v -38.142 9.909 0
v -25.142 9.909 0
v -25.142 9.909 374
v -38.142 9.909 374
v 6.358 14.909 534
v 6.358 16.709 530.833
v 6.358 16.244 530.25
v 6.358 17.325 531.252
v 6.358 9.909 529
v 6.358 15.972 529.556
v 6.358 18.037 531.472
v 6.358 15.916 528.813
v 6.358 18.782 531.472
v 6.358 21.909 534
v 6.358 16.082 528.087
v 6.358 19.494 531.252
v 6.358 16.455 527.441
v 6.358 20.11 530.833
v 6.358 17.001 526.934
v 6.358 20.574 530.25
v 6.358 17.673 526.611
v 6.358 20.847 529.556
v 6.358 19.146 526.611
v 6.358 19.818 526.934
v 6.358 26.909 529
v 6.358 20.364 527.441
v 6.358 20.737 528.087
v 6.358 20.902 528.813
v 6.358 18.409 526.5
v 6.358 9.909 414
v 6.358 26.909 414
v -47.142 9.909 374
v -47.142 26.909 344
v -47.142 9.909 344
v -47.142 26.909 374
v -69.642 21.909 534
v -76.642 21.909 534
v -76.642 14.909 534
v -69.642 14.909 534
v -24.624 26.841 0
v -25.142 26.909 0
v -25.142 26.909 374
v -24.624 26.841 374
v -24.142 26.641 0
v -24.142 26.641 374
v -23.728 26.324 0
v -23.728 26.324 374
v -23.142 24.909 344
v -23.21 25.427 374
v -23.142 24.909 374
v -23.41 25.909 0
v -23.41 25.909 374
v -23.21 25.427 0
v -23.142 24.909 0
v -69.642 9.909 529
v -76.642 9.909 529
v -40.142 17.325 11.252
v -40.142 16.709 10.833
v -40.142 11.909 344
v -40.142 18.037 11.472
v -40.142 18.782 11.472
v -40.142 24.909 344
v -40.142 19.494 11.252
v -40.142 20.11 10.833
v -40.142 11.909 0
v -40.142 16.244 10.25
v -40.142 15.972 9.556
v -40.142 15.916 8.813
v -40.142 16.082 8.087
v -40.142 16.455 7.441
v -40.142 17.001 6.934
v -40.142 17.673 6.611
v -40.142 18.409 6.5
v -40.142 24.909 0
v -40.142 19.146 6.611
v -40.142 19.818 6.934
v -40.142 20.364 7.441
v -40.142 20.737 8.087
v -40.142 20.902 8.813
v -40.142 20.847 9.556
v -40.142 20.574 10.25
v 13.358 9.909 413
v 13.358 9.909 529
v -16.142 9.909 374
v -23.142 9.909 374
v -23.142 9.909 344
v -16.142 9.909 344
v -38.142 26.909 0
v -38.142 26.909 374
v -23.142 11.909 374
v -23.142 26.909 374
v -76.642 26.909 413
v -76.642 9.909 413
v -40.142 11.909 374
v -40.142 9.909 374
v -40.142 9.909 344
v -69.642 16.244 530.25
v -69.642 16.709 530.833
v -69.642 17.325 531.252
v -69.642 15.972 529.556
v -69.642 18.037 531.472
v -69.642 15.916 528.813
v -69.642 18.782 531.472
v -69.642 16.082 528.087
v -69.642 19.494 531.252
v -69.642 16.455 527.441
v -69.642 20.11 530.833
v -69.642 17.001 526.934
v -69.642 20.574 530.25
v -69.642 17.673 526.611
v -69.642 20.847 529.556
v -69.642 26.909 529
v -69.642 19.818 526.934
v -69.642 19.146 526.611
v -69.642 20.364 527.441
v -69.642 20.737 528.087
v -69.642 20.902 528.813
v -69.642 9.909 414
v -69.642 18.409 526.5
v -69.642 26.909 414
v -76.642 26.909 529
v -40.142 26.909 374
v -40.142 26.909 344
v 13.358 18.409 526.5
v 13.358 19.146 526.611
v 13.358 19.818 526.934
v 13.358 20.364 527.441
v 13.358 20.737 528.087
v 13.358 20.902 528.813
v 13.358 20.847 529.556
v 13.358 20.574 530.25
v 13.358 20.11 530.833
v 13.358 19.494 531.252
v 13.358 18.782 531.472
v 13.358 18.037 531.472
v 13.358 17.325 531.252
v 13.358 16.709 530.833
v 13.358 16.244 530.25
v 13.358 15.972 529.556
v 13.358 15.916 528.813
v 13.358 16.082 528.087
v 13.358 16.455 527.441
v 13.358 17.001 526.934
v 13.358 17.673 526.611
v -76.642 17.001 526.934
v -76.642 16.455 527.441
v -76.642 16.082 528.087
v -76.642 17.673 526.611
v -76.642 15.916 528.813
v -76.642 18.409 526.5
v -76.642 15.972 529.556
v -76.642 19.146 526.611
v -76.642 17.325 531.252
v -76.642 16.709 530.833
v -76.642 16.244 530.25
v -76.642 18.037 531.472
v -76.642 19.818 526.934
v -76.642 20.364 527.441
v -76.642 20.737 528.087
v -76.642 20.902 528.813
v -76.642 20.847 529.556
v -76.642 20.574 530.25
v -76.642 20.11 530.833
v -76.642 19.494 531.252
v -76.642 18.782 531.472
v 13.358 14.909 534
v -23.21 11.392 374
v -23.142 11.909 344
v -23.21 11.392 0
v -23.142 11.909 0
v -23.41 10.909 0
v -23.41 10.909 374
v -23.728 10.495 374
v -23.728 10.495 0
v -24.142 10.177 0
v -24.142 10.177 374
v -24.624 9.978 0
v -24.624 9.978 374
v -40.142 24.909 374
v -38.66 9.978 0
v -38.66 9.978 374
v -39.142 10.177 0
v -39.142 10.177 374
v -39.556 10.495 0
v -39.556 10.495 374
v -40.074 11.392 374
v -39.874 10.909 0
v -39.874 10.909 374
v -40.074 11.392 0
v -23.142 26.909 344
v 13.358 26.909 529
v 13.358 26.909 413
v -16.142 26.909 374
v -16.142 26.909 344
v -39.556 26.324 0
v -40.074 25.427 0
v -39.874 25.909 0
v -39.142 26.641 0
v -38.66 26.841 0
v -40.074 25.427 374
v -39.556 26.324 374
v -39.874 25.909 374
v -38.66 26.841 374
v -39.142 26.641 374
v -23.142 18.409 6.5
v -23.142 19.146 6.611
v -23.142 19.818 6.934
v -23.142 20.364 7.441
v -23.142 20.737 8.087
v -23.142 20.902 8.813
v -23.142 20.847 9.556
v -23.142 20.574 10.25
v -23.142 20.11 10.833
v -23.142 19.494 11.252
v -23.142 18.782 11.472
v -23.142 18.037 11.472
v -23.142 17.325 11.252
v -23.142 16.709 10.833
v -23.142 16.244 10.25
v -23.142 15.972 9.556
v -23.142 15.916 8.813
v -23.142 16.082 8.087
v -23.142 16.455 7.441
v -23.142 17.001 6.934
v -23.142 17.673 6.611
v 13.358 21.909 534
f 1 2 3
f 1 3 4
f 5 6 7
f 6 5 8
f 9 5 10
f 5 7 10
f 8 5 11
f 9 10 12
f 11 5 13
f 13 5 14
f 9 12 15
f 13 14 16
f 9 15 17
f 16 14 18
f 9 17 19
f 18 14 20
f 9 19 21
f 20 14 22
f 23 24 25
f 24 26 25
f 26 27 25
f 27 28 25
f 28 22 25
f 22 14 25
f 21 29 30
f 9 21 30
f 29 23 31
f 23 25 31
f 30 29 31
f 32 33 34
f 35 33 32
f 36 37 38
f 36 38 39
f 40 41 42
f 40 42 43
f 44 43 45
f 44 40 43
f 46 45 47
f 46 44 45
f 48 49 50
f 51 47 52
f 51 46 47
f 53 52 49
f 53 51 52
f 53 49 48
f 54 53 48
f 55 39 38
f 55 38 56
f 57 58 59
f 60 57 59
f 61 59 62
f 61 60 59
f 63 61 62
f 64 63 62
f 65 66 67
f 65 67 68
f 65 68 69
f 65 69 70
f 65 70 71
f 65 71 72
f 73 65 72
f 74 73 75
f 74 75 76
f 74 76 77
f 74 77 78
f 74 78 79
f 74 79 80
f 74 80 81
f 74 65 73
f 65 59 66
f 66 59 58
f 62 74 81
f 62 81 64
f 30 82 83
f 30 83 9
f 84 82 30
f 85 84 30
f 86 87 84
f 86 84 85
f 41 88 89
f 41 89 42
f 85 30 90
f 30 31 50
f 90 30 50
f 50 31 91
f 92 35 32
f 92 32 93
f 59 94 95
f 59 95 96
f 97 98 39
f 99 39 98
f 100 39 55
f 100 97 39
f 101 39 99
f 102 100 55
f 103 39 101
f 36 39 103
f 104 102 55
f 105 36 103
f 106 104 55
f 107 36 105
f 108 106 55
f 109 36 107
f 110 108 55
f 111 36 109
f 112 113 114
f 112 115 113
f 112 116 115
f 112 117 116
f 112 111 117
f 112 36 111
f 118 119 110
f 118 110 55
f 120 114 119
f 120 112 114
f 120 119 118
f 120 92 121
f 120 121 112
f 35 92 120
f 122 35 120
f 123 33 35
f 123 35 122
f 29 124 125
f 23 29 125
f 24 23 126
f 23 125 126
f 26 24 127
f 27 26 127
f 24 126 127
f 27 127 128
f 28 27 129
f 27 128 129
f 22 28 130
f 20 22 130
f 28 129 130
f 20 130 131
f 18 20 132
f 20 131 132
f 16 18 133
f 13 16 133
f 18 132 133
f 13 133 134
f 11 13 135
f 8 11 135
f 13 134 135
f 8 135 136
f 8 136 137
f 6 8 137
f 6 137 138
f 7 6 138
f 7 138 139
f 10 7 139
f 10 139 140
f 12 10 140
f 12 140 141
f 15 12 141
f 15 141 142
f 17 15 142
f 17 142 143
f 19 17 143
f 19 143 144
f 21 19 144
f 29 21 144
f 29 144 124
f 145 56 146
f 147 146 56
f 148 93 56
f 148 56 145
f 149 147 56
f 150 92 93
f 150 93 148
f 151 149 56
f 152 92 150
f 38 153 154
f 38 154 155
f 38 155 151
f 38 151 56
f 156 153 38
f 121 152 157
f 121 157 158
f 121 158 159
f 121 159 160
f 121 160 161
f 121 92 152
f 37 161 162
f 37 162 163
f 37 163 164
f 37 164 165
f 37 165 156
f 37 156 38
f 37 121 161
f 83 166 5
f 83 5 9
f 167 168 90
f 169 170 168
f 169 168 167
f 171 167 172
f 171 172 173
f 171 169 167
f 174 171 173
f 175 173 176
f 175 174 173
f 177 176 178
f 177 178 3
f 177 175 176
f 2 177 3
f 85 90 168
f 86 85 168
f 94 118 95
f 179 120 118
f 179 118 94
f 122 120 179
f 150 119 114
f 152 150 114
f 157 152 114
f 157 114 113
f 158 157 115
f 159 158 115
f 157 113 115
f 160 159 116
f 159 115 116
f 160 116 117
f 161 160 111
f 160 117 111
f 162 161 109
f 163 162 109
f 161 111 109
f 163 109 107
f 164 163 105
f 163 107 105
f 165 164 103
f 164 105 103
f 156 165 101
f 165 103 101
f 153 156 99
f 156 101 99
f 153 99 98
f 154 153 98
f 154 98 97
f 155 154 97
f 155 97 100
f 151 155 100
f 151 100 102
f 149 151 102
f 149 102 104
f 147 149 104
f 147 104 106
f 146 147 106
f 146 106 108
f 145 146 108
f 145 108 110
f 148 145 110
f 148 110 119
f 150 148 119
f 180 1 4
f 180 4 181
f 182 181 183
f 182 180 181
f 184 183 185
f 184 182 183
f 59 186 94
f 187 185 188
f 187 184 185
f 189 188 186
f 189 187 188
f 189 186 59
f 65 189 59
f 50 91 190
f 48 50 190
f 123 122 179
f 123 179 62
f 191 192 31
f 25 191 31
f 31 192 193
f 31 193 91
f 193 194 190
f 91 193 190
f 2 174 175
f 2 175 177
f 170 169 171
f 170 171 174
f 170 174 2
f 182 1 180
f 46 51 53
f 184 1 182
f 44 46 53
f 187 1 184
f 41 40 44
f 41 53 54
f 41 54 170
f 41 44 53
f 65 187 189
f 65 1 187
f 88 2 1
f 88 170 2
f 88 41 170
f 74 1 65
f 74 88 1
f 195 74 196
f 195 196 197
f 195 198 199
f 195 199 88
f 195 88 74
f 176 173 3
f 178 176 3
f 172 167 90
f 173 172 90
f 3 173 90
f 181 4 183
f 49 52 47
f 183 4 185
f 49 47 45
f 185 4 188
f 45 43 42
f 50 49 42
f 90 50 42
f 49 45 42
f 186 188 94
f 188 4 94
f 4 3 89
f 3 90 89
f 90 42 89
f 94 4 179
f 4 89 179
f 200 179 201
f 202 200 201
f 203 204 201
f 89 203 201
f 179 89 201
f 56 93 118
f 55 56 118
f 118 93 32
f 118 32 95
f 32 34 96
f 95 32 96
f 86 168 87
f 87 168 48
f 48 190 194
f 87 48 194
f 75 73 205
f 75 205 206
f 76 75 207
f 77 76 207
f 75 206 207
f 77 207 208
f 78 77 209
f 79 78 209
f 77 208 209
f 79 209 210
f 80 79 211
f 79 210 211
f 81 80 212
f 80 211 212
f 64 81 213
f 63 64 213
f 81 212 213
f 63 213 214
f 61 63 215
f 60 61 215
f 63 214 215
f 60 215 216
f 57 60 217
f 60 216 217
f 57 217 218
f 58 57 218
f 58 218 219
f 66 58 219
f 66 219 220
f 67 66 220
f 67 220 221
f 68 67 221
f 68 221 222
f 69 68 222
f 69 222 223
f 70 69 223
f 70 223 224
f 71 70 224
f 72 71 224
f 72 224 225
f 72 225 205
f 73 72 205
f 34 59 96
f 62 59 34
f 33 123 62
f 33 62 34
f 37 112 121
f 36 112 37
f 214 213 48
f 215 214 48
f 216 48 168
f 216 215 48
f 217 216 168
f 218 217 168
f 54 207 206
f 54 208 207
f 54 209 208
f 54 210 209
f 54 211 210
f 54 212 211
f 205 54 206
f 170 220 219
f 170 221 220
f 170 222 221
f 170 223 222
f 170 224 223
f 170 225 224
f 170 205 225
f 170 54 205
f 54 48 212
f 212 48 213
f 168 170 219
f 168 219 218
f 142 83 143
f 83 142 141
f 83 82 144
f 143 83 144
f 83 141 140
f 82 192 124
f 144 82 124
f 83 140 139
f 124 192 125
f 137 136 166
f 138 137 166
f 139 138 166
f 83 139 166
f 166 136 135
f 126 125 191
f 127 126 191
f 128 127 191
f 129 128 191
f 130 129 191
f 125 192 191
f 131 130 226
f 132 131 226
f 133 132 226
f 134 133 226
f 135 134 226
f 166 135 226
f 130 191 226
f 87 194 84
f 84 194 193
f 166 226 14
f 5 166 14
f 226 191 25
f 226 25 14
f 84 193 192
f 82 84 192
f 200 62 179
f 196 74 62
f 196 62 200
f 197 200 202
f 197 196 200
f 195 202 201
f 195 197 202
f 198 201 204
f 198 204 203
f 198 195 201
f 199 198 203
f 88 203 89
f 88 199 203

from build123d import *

# Parameters (mm, degrees)
EXTRUDE1_DEPTH = 374
EXTRUDE2_DEPTH = 17
SKETCH4_R      = 2.5
EXTRUDE3_DEPTH = 91


with BuildPart() as part:
    # Sketch1 → Extrude1 (new body)
    with BuildSketch(Plane.XY):
        with BuildLine():
            Line((-38.142101627, 26.909417684), (-25.142101627, 26.909417684))
            ThreePointArc((-25.142101627, 26.909417684), (-23.727888065, 26.323631246), (-23.142101627, 24.909417684))
            Line((-23.142101627, 24.909417684), (-23.142101627, 11.909417684))
            ThreePointArc((-23.142101627, 11.909417684), (-23.727888065, 10.495204122), (-25.142101627, 9.909417684))
            Line((-25.142101627, 9.909417684), (-38.142101627, 9.909417684))
            ThreePointArc((-38.142101627, 9.909417684), (-39.55631519, 10.495204122), (-40.142101627, 11.909417684))
            Line((-40.142101627, 11.909417684), (-40.142101627, 24.909417684))
            ThreePointArc((-40.142101627, 24.909417684), (-39.55631519, 26.323631246), (-38.142101627, 26.909417684))
        make_face()
    extrude(amount=EXTRUDE1_DEPTH)

    # Sketch2 → Extrude2 (add)
    with BuildSketch(Plane(origin=(0, 26.909417684, 0), x_dir=(1, 0, 0), z_dir=(0, 1, 0))):
        Polygon((-23.142101627, -374), (-23.142101627, -344), (-16.142101627, -344), (-16.142101627, -374), (13.357898373, -413), (13.357898373, -534), (6.357898373, -534), (6.357898373, -414), align=None)
        Polygon((-40.142101627, -374), (-40.142101627, -344), (-47.142101627, -344), (-47.142101627, -374), (-76.642101627, -413), (-76.642101627, -534), (-69.642101627, -534), (-69.642101627, -414), align=None)
    extrude(amount=-EXTRUDE2_DEPTH)

    # Sketch4 → Extrude3 (cut, through all)
    with BuildSketch(Plane(origin=(13.357898373, 0, 0), x_dir=(0, 0, -1), z_dir=(1, 0, 0))):
        with Locations((-529, 18.409417684)):
            Circle(SKETCH4_R)
        with Locations((-9, 18.409417684)):
            Circle(SKETCH4_R)
        Polygon((-529, 26.909417684), (-534, 21.909417684), (-534, 14.909417684), (-529, 9.909417684), (-529, 0), (-556.33894416, 6.720406123), (-552.141138814, 40.050556498), (-531.5, 37.450883772), align=None)
    extrude(amount=-EXTRUDE3_DEPTH, mode=Mode.SUBTRACT)


solid = part.part
